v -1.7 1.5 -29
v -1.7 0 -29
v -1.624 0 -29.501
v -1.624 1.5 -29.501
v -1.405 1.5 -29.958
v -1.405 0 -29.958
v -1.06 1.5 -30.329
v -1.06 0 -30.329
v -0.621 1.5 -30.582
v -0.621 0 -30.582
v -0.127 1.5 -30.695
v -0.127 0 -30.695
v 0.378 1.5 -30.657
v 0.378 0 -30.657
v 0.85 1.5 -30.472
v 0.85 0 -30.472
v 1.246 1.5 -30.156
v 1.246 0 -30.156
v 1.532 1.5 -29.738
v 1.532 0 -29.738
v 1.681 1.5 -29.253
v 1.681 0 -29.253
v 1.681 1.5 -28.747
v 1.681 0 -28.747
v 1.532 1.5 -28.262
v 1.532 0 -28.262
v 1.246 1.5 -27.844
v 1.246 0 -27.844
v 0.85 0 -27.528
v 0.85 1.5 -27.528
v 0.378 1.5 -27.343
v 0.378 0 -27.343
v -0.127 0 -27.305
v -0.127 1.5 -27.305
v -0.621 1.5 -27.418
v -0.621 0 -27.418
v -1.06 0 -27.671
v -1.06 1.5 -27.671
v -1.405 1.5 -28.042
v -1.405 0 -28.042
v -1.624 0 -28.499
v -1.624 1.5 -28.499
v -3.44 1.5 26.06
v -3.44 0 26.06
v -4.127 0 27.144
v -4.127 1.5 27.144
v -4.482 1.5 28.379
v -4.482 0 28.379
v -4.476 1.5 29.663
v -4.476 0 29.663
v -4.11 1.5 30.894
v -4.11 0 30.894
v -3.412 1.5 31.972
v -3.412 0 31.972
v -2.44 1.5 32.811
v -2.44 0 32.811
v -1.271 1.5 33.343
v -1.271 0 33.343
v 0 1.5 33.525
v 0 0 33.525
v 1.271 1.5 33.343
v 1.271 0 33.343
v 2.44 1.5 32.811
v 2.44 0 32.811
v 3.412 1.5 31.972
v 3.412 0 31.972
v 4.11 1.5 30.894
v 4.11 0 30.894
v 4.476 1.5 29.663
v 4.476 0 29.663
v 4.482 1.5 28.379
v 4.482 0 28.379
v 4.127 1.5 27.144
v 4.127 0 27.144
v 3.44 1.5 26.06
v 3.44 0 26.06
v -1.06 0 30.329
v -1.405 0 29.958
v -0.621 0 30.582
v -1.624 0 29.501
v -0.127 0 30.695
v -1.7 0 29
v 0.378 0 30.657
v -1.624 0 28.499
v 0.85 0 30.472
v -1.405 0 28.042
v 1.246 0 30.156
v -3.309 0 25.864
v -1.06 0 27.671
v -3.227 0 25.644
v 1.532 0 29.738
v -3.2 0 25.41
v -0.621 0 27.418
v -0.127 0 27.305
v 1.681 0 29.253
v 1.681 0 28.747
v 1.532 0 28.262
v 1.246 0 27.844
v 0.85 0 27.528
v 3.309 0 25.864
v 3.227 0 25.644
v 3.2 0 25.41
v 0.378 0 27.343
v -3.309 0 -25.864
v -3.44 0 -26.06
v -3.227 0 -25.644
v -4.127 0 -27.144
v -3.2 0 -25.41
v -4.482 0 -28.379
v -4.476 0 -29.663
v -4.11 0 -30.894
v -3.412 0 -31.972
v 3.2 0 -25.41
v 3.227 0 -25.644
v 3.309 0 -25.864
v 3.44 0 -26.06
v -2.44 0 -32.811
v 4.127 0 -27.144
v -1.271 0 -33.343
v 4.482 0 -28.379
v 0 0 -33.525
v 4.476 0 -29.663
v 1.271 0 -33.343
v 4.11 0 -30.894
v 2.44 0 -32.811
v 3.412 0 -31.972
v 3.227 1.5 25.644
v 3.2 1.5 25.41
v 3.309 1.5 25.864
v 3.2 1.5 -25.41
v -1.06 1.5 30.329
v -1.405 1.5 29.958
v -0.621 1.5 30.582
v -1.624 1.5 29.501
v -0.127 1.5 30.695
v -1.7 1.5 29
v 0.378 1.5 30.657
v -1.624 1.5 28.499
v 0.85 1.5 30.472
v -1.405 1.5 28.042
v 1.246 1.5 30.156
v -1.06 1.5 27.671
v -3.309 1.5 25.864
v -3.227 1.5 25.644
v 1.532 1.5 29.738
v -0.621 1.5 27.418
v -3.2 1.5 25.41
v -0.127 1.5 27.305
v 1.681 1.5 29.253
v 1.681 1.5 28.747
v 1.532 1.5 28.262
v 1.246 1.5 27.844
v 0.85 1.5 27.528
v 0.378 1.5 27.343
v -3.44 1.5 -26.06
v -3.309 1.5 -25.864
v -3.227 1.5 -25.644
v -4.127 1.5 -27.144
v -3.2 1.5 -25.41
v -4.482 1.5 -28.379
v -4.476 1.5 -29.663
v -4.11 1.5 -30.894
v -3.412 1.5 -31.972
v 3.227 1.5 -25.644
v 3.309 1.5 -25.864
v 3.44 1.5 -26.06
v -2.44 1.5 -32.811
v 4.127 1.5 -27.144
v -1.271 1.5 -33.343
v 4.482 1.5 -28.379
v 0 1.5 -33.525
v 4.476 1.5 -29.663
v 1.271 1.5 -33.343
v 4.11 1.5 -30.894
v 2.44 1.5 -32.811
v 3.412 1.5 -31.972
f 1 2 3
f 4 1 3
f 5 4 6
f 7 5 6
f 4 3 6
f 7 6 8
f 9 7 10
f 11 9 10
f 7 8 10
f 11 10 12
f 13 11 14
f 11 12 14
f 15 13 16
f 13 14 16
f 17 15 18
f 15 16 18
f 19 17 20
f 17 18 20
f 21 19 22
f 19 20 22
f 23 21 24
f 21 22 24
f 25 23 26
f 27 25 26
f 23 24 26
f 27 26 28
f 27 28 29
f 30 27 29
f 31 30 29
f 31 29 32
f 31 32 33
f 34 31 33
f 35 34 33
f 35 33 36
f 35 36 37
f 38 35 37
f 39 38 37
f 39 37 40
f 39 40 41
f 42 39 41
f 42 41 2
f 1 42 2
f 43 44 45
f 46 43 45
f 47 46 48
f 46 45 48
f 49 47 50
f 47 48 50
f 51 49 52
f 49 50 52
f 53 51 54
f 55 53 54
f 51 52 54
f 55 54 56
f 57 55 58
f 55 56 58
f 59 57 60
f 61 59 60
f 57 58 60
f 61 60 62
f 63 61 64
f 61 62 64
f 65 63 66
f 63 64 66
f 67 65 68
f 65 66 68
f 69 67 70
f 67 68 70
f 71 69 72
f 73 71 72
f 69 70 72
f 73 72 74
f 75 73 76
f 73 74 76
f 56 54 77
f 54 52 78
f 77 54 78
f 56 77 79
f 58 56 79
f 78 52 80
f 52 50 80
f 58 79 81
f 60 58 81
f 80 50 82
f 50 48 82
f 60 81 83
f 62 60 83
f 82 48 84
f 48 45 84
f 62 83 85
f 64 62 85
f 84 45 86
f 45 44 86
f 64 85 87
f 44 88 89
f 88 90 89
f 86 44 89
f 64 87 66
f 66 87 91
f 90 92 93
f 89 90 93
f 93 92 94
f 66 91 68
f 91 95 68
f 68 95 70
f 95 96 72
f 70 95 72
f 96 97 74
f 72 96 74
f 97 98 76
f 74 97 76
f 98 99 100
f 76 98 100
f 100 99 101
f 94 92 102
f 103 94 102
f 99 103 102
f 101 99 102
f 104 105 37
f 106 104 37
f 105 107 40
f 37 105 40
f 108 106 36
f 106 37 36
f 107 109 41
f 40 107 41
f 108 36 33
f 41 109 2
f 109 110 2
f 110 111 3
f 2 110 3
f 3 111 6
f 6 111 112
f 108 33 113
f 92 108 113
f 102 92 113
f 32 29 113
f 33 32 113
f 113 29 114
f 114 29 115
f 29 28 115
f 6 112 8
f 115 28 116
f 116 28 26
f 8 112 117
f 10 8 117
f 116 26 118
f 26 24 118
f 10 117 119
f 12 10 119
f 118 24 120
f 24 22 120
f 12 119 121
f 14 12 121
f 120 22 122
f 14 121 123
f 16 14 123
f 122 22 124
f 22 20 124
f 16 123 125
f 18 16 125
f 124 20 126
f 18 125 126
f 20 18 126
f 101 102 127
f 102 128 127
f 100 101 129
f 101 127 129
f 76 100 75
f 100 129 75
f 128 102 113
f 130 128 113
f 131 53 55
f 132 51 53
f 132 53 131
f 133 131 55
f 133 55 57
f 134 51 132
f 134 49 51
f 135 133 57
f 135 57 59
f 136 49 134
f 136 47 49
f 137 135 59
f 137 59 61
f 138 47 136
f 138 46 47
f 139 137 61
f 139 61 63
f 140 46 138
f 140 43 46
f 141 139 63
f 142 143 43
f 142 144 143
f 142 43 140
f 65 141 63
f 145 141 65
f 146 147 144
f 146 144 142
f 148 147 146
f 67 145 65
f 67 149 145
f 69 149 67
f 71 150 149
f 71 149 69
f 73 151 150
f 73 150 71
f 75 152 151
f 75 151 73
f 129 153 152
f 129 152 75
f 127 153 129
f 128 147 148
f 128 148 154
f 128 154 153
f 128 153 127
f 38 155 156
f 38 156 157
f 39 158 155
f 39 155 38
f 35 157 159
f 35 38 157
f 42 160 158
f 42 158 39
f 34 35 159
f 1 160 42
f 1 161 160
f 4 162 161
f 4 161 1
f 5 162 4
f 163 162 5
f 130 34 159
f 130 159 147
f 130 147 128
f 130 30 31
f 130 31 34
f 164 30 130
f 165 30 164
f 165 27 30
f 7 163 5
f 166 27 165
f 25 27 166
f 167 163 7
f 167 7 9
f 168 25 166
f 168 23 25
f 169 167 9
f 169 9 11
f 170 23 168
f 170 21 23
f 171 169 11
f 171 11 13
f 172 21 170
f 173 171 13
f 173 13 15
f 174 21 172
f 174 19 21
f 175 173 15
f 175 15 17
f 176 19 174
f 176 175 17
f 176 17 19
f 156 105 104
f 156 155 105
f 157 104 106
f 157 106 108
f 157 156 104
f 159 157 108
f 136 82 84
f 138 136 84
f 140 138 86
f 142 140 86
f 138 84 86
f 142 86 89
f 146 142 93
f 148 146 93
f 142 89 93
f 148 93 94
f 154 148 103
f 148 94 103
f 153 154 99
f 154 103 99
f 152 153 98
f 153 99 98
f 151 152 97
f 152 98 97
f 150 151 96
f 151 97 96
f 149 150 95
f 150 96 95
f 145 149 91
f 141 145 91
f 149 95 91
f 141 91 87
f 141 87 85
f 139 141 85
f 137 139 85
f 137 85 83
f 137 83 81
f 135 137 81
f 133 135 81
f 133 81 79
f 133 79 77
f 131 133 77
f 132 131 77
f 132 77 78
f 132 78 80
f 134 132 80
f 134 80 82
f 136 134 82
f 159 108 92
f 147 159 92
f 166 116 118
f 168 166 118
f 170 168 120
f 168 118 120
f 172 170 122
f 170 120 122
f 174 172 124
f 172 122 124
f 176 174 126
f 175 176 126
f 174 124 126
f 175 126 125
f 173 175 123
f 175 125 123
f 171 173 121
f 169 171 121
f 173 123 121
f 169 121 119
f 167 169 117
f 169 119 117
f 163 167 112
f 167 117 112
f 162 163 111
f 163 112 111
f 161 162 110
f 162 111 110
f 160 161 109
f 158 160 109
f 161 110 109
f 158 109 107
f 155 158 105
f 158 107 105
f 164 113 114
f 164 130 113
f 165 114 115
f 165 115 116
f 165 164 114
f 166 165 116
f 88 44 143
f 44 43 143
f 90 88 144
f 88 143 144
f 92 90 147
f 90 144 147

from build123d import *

# Parameters (mm, degrees)
SKETCH2_R            = 4.525
BOSS_EXTRUDE1_DEPTH  = 1.5
M3_CLEARANCE_HOLE1_D = 3.4
FILLET1_R            = 1


with BuildPart() as part:
    # Sketch2 → Boss-Extrude1 (new body)
    with BuildSketch(Plane(origin=(0, 0, 0), x_dir=(1, 0, 0), z_dir=(0, 1, 0))):
        with Locations((0, -29)):
            Circle(SKETCH2_R)
        with BuildLine():
            Line((3.199658185, -25.800341815), (3.199658185, 25.800341815))
            ThreePointArc((3.199658185, 25.800341815), (0, 24.475), (-3.199658185, 25.800341815))
            Line((-3.199658185, 25.800341815), (-3.199658185, -25.800341815))
            ThreePointArc((-3.199658185, -25.800341815), (0, -24.475), (3.199658185, -25.800341815))
        make_face()
        with Locations((0, 29)):
            Circle(SKETCH2_R)
    extrude(amount=BOSS_EXTRUDE1_DEPTH)

    # M3 Clearance Hole1 (through all)
    with Locations(Plane(origin=(0, 1.5, 0), x_dir=(1, 0, 0), z_dir=(0, 1, 0))):
        with Locations((0, 29), (0, -29)):
            Hole(M3_CLEARANCE_HOLE1_D / 2)

    # Fillet1
    fillet1_edges = [part.edges().sort_by_distance(p)[0] for p in [
        (-3.199658185, 0.75, 25.800341815),
        (-3.199658185, 0.75, -25.800341815),
        (3.199658185, 0.75, -25.800341815),
        (3.199658185, 0.75, 25.800341815),
    ]]
    fillet(fillet1_edges, radius=FILLET1_R)


solid = part.part
